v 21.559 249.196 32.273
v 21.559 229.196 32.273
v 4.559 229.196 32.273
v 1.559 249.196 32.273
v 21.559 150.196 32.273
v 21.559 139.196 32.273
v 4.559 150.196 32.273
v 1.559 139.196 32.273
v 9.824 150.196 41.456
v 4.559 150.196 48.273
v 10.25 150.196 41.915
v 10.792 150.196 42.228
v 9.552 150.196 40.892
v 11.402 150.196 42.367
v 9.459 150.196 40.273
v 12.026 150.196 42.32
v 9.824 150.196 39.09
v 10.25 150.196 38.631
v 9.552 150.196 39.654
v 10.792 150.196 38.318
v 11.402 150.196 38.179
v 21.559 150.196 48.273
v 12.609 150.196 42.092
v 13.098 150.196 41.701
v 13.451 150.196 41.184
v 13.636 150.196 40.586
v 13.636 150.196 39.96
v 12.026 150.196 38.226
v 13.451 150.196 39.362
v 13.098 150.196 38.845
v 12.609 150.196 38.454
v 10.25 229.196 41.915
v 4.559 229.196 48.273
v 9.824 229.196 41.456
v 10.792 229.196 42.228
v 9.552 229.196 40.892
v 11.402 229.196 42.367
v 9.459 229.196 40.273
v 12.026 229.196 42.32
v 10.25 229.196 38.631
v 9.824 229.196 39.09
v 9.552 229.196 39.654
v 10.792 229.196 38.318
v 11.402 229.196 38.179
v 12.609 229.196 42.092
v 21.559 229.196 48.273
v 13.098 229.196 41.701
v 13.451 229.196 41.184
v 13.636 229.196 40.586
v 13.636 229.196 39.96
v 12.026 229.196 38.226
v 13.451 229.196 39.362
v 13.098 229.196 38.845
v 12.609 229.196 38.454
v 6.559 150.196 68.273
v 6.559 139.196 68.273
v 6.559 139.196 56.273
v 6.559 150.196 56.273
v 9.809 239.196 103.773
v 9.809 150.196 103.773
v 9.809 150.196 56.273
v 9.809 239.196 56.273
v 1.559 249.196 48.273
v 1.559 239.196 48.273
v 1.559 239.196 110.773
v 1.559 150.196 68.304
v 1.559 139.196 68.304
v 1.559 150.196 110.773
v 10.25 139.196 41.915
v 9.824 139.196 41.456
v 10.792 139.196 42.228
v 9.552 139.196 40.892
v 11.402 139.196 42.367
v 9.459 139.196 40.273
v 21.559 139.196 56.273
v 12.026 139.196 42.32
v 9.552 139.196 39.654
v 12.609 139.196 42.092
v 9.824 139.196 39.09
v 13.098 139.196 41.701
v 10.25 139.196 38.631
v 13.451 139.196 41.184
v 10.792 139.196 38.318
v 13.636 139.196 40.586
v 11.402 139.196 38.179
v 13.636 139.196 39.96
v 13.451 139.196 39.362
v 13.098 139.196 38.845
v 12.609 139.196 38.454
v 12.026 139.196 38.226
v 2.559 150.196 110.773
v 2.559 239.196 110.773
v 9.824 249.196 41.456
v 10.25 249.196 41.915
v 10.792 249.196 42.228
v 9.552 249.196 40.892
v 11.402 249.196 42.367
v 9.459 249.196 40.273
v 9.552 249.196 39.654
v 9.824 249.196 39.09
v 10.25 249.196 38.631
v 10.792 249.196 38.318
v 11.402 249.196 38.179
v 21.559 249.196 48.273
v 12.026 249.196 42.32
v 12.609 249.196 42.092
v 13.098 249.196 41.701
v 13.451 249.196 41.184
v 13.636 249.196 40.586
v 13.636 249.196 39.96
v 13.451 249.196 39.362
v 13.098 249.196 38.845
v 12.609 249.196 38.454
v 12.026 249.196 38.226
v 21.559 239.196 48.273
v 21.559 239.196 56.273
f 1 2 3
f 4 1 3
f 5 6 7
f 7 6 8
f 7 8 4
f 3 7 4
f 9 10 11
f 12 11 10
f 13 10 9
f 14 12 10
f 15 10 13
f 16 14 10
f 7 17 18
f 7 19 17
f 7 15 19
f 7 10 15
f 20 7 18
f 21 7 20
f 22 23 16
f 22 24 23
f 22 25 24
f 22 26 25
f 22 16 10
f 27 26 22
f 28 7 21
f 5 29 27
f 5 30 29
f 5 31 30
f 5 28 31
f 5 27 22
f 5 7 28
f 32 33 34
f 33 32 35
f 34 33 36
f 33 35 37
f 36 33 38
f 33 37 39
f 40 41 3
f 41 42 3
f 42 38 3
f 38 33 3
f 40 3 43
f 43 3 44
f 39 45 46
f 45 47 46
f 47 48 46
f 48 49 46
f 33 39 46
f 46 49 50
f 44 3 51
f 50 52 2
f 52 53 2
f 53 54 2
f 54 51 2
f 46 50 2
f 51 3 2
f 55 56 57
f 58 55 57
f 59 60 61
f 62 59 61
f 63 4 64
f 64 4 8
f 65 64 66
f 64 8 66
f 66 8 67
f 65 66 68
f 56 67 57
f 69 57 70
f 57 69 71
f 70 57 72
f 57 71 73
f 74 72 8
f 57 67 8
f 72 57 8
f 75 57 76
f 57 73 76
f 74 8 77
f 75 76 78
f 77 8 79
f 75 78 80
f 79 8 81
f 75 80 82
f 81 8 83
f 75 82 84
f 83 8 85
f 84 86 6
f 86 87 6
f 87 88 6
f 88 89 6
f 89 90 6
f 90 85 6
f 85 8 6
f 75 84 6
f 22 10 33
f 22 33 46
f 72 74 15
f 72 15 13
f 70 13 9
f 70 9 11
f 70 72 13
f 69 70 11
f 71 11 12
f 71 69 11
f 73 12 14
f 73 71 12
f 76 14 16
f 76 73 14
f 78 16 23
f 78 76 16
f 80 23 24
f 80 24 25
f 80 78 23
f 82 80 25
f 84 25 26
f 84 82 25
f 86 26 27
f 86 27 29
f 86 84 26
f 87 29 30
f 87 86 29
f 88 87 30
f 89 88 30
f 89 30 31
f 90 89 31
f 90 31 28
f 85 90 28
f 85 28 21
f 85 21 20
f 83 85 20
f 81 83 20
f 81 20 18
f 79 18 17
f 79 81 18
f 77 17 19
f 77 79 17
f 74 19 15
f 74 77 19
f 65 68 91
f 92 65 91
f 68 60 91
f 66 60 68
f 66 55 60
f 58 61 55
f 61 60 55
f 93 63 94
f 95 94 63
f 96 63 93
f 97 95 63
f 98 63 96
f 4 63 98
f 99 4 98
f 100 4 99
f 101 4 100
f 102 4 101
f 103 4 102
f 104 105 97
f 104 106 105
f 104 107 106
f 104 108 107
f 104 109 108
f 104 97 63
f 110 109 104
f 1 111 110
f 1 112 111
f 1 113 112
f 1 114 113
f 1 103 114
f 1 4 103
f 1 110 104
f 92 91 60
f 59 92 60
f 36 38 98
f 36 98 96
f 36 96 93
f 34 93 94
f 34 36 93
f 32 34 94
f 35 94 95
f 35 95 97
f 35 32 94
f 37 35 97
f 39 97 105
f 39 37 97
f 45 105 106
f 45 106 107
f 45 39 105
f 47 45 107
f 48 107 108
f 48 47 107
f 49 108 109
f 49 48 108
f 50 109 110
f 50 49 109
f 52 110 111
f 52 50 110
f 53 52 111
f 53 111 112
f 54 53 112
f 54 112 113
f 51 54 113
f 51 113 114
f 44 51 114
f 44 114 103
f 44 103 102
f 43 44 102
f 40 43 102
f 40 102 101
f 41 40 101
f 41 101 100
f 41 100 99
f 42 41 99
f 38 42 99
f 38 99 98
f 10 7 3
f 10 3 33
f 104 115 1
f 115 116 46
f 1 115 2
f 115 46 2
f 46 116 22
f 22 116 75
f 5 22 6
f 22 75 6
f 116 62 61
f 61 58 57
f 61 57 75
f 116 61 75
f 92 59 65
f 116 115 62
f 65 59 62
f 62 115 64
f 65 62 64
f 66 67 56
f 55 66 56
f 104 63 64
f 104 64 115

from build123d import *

# Parameters (mm, degrees)
SKETCH_1_R          = 2.1
EXTRUDE_1_DEPTH     = 11
EXTRUDE_2_DEPTH     = 79
SKETCH_3_R          = 2.1
EXTRUDE_3_DEPTH     = 10
EXTRUDE_START       = -10
SKETCH_3_2_R        = 2.1
EXTRUDE_4_DEPTH     = 10
CUT_EXTRUDE_6_DEPTH = 10


with BuildPart() as part:
    # Эскиз1 → Бобышка-Вытянуть1 (new body)
    with BuildSketch(Plane(origin=(0, 139.195974268, 0), x_dir=(1, 0, 0), z_dir=(0, 1, 0))):
        Polygon((21.558980694, -32.273129836), (1.558980694, -32.273129836), (1.558980694, -68.304125072), (6.558980694, -68.273129836), (6.558980694, -56.273129836), (21.558980694, -56.273129836), align=None)
        with Locations((11.55898069, -40.273129836)):
            Circle(SKETCH_1_R, mode=Mode.SUBTRACT)
    extrude(amount=EXTRUDE_1_DEPTH)

    # Эскиз2 → Бобышка-Вытянуть2 (add)
    with BuildSketch(Plane(origin=(0, 150.195974268, 0), x_dir=(1, 0, 0), z_dir=(0, 1, 0))):
        Polygon((1.558980694, -32.273129836), (4.558980694, -32.273129836), (4.558980694, -48.273129836), (21.558980694, -48.273129836), (21.558980694, -56.273129836), (9.808980694, -56.273129836), (9.808980694, -103.773129836), (2.558980694, -110.773129836), (1.558980694, -110.773129836), align=None)
    extrude(amount=EXTRUDE_2_DEPTH)



with BuildPart() as body_2:
    # Эскиз3 → Бобышка-Вытянуть3 (new body)
    with BuildSketch(Plane(origin=(0, 239.195974268, 0), x_dir=(1, 0, 0), z_dir=(0, 1, 0))):
        Polygon((1.558980694, -32.273129836), (1.558980694, -110.773129836), (2.558980694, -110.773129836), (9.808980694, -103.773129836), (9.808980694, -56.273129836), (21.558980694, -56.273129836), (21.558980694, -32.273129836), align=None)
        with Locations((11.55898069, -40.273129836)):
            Circle(SKETCH_3_R, mode=Mode.SUBTRACT)
    extrude(amount=EXTRUDE_3_DEPTH)


with BuildPart() as part_1:
    add(part.part)

    add(body_2.part)  # Бобышка-Вытянуть4 merges body 2
    # Эскиз3<2> → Бобышка-Вытянуть4 (add)
    with BuildSketch(Plane(origin=(0, 239.195974268, 0), x_dir=(1, 0, 0), z_dir=(0, 1, 0)).offset(EXTRUDE_START)):
        Polygon((1.558980694, -32.273129836), (1.558980694, -110.773129836), (2.558980694, -110.773129836), (9.808980694, -103.773129836), (9.808980694, -56.273129836), (21.558980694, -56.273129836), (21.558980694, -32.273129836), align=None)
        with Locations((11.55898069, -40.273129836)):
            Circle(SKETCH_3_2_R, mode=Mode.SUBTRACT)
    extrude(amount=EXTRUDE_4_DEPTH)

    # Эскиз5 → Вырез-Вытянуть6 (cut)
    with BuildSketch(Plane(origin=(0, 249.195974268, 0), x_dir=(1, 0, 0), z_dir=(0, 1, 0))):
        Polygon((1.558980694, -110.773129836), (1.558980694, -48.273129836), (21.558980694, -48.273129836), (21.558980694, -56.273129836), (9.808980694, -56.273129836), (9.808980694, -103.773129836), (2.558980694, -110.773129836), align=None)
    extrude(amount=-CUT_EXTRUDE_6_DEPTH, mode=Mode.SUBTRACT)


solid = part_1.part
